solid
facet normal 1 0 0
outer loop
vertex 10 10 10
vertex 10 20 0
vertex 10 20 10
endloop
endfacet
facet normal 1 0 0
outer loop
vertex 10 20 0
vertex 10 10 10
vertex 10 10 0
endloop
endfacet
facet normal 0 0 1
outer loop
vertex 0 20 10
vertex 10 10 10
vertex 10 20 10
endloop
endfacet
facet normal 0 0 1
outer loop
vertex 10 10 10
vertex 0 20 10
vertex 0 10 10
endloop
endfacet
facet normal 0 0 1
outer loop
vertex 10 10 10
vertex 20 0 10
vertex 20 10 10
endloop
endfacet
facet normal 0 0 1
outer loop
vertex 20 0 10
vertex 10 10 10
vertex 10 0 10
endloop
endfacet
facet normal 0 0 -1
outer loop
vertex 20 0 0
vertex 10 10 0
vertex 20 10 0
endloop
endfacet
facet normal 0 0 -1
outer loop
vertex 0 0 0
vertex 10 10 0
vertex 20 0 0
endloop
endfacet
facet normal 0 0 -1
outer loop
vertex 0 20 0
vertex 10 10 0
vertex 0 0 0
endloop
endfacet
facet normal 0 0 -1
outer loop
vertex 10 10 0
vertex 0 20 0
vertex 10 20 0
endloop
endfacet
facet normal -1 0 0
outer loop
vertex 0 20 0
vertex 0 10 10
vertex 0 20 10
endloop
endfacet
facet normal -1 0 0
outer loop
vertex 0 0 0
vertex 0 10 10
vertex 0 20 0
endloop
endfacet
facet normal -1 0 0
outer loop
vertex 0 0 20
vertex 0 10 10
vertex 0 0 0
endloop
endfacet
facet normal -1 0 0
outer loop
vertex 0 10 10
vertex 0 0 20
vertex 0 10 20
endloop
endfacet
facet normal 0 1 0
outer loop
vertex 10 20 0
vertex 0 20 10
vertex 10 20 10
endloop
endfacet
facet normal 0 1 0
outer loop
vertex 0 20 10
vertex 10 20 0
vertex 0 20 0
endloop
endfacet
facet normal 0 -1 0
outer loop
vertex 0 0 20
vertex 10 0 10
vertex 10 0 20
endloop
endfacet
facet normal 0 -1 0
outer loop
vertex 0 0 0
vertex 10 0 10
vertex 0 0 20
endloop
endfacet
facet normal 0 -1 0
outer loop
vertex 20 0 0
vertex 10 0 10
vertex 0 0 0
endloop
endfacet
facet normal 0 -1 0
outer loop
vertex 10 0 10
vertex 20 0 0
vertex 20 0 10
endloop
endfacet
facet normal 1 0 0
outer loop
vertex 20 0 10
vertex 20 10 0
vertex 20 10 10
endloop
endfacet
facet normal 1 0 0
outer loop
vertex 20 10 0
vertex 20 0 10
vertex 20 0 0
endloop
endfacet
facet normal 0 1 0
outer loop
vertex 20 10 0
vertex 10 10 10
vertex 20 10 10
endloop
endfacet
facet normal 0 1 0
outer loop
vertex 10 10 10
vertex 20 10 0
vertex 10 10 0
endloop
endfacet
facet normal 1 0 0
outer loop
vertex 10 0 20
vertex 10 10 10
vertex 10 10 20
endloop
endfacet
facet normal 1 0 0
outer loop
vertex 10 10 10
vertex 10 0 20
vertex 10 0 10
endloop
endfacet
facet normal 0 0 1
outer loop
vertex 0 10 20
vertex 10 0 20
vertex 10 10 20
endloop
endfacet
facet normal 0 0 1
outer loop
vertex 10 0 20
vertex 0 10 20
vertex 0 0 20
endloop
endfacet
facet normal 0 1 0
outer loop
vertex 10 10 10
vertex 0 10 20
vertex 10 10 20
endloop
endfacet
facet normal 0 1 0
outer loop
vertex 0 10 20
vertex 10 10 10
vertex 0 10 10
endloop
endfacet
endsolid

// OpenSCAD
// by: Scorch
// http://www.scorchworks.com/Blog/openscad-modules-for-automatic-fillets-and-radii/
// www.scorchworks.com
// 12/29/2015

// PARAMETERS

sample_R    = 1;      // Radius of the fillet/round to be added

sample_OB   = 1000;   // Outer boundary (should be larger than model outer boundary)

sample_axis = "xyz";  // ["xyz":"xyz",x:x,y:y,z:z]
                      // axes to round choose one (x,y,z, or xyz)

sample_fn   = 6;      // number of facets on radius (per 360 degrees)

MAKE_EXAMPLE = 7;    // [0:Generate sample base part,1: Add fillets to base part,2: Add rounds to base part,3: Add fillets and rounds to base part,4: Add local fillets to base part,5: Add local rounds to base part,6: Add local fillets and local rounds to base part, 7: Show transparent local area selection box on base part]

//-1: Do not make example part
// 0: Generate sample base part
// 1: Add fillets to base part 
// 2: Add rounds to base part 
// 3: Add fillets and rounds to base part 
// 4: Add local fillets to base part 
// 5: Add local rounds to base part 
// 6: Add local fillets and local rounds to base part 
// 7: Show transparent local area selection box on base part 
//

//////////////////////////////////////////////////////////////////////////
//////////////////////////////////////////////////////////////////////////

// The add_fillets module will either auto fillet the whole model or
// a section of the model depending on if ther are one or two children.
// 1 child:       Fillet the whole model
// Two children:  Fillet the first child in the area that is
//                 intersected by the second child 
module add_fillets(R=1,OB=1000,axis="xyz",fn=10)
{
    fn_even = ceil(fn/2)*2;
    if ($children==1)
    {
        minkowski_fillets(R=R,OB=OB,axis=axis,fn=fn_even)
        {
            children(0);
        }
    }
    if ($children==2)
    {
        union()
        {
            minkowski_fillets(R=R,OB=OB,axis=axis,fn=fn_even)
            {
                intersection()
                {
                    children(0);
                    children(1);
                }
            }
            difference()
            {
                children(0);
                children(1);
            }
        }
    }
}


// The add_rounds module will either auto round the whole model or
// a section of the model depending on if ther are one or two children.
// 1 child:       Round the whole model
// Two children:  Round the first child in the area that is
//                  intersected by the second child 
module add_rounds(R=1,OB=1000,axis="xyz",fn=10)
{
    fn_even = ceil(fn/2)*2;
    if ($children==1)
    {
        minkowski_rounds(R=R,OB=OB,axis=axis,fn=fn_even)
        {
            children(0);
        }
    }
    if ($children==2)
    {
        union()
        {
            minkowski_rounds(R=R,OB=OB,axis=axis,fn=fn_even)
            {
                intersection()
                {
                    children(0);
                    minkowski()
                    {
                        children(1);
                        if (axis=="x")   rotate([0 ,90,0]) cylinder(r=R,$fn=fn_even,center=true);
                        if (axis=="y")   rotate([90,0 ,0]) cylinder(r=R,$fn=fn_even,center=true);
                        if (axis=="z")   rotate([0 ,0 ,0]) cylinder(r=R,$fn=fn_even,center=true);
                        if (axis=="xyz") sphere(r=R,$fn=fn_even);
                    }
                }
            }
            difference()
            {
                children(0);
                children(1);
            }
        }
    }
}




module minkowski_fillets(R=1,OB=1000,axis="xyz",fn=10)
{
    OBplus=OB+4*R;
    fn_even = ceil(fn/2)*2;
    echo(fn_even);
    difference()
    {
        cube([OB,OB,OB],center=true);
        minkowski()
        {   
            difference()
            {
                cube([OBplus,OBplus,OBplus],center=true);
                minkowski()
                {
                    children(0);
                    if (axis=="x")   rotate([0 ,90,0]) cylinder(r=R,$fn=fn_even,center=true);
                    if (axis=="y")   rotate([90,0 ,0]) cylinder(r=R,$fn=fn_even,center=true);
                    if (axis=="z")   rotate([0 ,0 ,0]) cylinder(r=R,$fn=fn_even,center=true);
                    if (axis=="xyz") sphere(r=R,$fn=fn);
                }
            }
            if (axis=="x")   rotate([0 ,90,0]) cylinder(r=R,$fn=fn_even,center=true);
            if (axis=="y")   rotate([90,0 ,0]) cylinder(r=R,$fn=fn_even,center=true);
            if (axis=="z")   rotate([0 ,0 ,0]) cylinder(r=R,$fn=fn_even,center=true);
            if (axis=="xyz") sphere(r=R,$fn=fn_even);
        }
    }
}


module minkowski_rounds(R=1,OB=1000,axis="xyz",fn=10)
{
    OBplus=OB+4*R;
    fn_even = ceil(fn/2)*2;
    minkowski()
    {  
        difference()
        {
            cube([OB,OB,OB],center=true);
            minkowski()
            {
                difference()
                {
                    cube([OBplus,OBplus,OBplus],center=true);
                    children(0);
                }
                if (axis=="x")   rotate([0 ,90,0]) cylinder(r=R,$fn=fn_even,center=true);
                if (axis=="y")   rotate([90,0 ,0]) cylinder(r=R,$fn=fn_even,center=true);
                if (axis=="z")   rotate([0 ,0 ,0]) cylinder(r=R,$fn=fn_even,center=true);
                if (axis=="xyz") sphere(r=R,$fn=fn_even);
            }
        }
        if (axis=="x")   rotate([0 ,90,0]) cylinder(r=R,$fn=fn,center=true);
        if (axis=="y")   rotate([90,0 ,0]) cylinder(r=R,$fn=fn,center=true);
        if (axis=="z")   rotate([0 ,0 ,0]) cylinder(r=R,$fn=fn,center=true);
        if (axis=="xyz") sphere(r=R,$fn=fn_even);      
    }
}

//////////////////////////////////////////////////////////
//The remainder of this file contains the Sample models //
//////////////////////////////////////////////////////////
// ------------------------------   
// Base sample object
// ------------------------------
if (MAKE_EXAMPLE==0)
    fillets_and_rounds_sample_object();

// ------------------------------   
// Sample add fillets
// ------------------------------
if (MAKE_EXAMPLE==1)
    render()
        add_fillets(R=sample_R,OB=sample_OB,axis=sample_axis,fn=sample_fn)
            fillets_and_rounds_sample_object();

// ------------------------------   
// Sample add rounds
// ------------------------------
if (MAKE_EXAMPLE==2)
    render()
        add_rounds(R=sample_R,OB=sample_OB,axis=sample_axis,fn=sample_fn)
            fillets_and_rounds_sample_object();
   
// ------------------------------   
// Sample add rounds and fillets
// ------------------------------
if (MAKE_EXAMPLE==3)
{
    render()
        add_fillets(R=sample_R,OB=sample_OB,axis=sample_axis,fn=sample_fn)
            add_rounds(R=sample_R,OB=sample_OB,axis=sample_axis,fn=sample_fn)
                fillets_and_rounds_sample_object();
}       

// ------------------------------   
// Sample add local fillets
// ------------------------------
if (MAKE_EXAMPLE==4)
{
    render()
        add_fillets(R=sample_R,OB=sample_OB,axis=sample_axis,fn=sample_fn)
        {
            fillets_and_rounds_sample_object();
            translate([10,10,0])cube([10,10,50],center=true);
        }
}

// ------------------------------   
// Sample add local rounds
// ------------------------------
if (MAKE_EXAMPLE==5)
{
    render()
        add_rounds(R=sample_R,OB=sample_OB,axis=sample_axis,fn=sample_fn)
        {
            fillets_and_rounds_sample_object();
            translate([10,10,0])cube([10,10,50],center=true);
        }
}

// ------------------------------   
// Sample add rounds and fillets
// ------------------------------
if (MAKE_EXAMPLE==6)
{
    render()
        add_fillets(R=sample_R,OB=sample_OB,axis=sample_axis,fn=sample_fn)
        {
            add_rounds(R=sample_R,OB=sample_OB,axis=sample_axis,fn=sample_fn)
            {
                fillets_and_rounds_sample_object();
                translate([10,10,0])cube([10,10,50],center=true);
            }
            translate([10,10,0])cube([10,10,50],center=true);
        }
}


// ------------------------------   
// Sample Show Intersecting Box
// ------------------------------
if (MAKE_EXAMPLE==7)
{
    fillets_and_rounds_sample_object();
    %translate([10,10,0])cube([10,10,50],center=true);

}

// -------------------
// Sample Object module
// -------------------
module fillets_and_rounds_sample_object()
{
    cube([10,20,10]);
    cube([20,10,10]);
    cube([10,10,20]);
}

// END
